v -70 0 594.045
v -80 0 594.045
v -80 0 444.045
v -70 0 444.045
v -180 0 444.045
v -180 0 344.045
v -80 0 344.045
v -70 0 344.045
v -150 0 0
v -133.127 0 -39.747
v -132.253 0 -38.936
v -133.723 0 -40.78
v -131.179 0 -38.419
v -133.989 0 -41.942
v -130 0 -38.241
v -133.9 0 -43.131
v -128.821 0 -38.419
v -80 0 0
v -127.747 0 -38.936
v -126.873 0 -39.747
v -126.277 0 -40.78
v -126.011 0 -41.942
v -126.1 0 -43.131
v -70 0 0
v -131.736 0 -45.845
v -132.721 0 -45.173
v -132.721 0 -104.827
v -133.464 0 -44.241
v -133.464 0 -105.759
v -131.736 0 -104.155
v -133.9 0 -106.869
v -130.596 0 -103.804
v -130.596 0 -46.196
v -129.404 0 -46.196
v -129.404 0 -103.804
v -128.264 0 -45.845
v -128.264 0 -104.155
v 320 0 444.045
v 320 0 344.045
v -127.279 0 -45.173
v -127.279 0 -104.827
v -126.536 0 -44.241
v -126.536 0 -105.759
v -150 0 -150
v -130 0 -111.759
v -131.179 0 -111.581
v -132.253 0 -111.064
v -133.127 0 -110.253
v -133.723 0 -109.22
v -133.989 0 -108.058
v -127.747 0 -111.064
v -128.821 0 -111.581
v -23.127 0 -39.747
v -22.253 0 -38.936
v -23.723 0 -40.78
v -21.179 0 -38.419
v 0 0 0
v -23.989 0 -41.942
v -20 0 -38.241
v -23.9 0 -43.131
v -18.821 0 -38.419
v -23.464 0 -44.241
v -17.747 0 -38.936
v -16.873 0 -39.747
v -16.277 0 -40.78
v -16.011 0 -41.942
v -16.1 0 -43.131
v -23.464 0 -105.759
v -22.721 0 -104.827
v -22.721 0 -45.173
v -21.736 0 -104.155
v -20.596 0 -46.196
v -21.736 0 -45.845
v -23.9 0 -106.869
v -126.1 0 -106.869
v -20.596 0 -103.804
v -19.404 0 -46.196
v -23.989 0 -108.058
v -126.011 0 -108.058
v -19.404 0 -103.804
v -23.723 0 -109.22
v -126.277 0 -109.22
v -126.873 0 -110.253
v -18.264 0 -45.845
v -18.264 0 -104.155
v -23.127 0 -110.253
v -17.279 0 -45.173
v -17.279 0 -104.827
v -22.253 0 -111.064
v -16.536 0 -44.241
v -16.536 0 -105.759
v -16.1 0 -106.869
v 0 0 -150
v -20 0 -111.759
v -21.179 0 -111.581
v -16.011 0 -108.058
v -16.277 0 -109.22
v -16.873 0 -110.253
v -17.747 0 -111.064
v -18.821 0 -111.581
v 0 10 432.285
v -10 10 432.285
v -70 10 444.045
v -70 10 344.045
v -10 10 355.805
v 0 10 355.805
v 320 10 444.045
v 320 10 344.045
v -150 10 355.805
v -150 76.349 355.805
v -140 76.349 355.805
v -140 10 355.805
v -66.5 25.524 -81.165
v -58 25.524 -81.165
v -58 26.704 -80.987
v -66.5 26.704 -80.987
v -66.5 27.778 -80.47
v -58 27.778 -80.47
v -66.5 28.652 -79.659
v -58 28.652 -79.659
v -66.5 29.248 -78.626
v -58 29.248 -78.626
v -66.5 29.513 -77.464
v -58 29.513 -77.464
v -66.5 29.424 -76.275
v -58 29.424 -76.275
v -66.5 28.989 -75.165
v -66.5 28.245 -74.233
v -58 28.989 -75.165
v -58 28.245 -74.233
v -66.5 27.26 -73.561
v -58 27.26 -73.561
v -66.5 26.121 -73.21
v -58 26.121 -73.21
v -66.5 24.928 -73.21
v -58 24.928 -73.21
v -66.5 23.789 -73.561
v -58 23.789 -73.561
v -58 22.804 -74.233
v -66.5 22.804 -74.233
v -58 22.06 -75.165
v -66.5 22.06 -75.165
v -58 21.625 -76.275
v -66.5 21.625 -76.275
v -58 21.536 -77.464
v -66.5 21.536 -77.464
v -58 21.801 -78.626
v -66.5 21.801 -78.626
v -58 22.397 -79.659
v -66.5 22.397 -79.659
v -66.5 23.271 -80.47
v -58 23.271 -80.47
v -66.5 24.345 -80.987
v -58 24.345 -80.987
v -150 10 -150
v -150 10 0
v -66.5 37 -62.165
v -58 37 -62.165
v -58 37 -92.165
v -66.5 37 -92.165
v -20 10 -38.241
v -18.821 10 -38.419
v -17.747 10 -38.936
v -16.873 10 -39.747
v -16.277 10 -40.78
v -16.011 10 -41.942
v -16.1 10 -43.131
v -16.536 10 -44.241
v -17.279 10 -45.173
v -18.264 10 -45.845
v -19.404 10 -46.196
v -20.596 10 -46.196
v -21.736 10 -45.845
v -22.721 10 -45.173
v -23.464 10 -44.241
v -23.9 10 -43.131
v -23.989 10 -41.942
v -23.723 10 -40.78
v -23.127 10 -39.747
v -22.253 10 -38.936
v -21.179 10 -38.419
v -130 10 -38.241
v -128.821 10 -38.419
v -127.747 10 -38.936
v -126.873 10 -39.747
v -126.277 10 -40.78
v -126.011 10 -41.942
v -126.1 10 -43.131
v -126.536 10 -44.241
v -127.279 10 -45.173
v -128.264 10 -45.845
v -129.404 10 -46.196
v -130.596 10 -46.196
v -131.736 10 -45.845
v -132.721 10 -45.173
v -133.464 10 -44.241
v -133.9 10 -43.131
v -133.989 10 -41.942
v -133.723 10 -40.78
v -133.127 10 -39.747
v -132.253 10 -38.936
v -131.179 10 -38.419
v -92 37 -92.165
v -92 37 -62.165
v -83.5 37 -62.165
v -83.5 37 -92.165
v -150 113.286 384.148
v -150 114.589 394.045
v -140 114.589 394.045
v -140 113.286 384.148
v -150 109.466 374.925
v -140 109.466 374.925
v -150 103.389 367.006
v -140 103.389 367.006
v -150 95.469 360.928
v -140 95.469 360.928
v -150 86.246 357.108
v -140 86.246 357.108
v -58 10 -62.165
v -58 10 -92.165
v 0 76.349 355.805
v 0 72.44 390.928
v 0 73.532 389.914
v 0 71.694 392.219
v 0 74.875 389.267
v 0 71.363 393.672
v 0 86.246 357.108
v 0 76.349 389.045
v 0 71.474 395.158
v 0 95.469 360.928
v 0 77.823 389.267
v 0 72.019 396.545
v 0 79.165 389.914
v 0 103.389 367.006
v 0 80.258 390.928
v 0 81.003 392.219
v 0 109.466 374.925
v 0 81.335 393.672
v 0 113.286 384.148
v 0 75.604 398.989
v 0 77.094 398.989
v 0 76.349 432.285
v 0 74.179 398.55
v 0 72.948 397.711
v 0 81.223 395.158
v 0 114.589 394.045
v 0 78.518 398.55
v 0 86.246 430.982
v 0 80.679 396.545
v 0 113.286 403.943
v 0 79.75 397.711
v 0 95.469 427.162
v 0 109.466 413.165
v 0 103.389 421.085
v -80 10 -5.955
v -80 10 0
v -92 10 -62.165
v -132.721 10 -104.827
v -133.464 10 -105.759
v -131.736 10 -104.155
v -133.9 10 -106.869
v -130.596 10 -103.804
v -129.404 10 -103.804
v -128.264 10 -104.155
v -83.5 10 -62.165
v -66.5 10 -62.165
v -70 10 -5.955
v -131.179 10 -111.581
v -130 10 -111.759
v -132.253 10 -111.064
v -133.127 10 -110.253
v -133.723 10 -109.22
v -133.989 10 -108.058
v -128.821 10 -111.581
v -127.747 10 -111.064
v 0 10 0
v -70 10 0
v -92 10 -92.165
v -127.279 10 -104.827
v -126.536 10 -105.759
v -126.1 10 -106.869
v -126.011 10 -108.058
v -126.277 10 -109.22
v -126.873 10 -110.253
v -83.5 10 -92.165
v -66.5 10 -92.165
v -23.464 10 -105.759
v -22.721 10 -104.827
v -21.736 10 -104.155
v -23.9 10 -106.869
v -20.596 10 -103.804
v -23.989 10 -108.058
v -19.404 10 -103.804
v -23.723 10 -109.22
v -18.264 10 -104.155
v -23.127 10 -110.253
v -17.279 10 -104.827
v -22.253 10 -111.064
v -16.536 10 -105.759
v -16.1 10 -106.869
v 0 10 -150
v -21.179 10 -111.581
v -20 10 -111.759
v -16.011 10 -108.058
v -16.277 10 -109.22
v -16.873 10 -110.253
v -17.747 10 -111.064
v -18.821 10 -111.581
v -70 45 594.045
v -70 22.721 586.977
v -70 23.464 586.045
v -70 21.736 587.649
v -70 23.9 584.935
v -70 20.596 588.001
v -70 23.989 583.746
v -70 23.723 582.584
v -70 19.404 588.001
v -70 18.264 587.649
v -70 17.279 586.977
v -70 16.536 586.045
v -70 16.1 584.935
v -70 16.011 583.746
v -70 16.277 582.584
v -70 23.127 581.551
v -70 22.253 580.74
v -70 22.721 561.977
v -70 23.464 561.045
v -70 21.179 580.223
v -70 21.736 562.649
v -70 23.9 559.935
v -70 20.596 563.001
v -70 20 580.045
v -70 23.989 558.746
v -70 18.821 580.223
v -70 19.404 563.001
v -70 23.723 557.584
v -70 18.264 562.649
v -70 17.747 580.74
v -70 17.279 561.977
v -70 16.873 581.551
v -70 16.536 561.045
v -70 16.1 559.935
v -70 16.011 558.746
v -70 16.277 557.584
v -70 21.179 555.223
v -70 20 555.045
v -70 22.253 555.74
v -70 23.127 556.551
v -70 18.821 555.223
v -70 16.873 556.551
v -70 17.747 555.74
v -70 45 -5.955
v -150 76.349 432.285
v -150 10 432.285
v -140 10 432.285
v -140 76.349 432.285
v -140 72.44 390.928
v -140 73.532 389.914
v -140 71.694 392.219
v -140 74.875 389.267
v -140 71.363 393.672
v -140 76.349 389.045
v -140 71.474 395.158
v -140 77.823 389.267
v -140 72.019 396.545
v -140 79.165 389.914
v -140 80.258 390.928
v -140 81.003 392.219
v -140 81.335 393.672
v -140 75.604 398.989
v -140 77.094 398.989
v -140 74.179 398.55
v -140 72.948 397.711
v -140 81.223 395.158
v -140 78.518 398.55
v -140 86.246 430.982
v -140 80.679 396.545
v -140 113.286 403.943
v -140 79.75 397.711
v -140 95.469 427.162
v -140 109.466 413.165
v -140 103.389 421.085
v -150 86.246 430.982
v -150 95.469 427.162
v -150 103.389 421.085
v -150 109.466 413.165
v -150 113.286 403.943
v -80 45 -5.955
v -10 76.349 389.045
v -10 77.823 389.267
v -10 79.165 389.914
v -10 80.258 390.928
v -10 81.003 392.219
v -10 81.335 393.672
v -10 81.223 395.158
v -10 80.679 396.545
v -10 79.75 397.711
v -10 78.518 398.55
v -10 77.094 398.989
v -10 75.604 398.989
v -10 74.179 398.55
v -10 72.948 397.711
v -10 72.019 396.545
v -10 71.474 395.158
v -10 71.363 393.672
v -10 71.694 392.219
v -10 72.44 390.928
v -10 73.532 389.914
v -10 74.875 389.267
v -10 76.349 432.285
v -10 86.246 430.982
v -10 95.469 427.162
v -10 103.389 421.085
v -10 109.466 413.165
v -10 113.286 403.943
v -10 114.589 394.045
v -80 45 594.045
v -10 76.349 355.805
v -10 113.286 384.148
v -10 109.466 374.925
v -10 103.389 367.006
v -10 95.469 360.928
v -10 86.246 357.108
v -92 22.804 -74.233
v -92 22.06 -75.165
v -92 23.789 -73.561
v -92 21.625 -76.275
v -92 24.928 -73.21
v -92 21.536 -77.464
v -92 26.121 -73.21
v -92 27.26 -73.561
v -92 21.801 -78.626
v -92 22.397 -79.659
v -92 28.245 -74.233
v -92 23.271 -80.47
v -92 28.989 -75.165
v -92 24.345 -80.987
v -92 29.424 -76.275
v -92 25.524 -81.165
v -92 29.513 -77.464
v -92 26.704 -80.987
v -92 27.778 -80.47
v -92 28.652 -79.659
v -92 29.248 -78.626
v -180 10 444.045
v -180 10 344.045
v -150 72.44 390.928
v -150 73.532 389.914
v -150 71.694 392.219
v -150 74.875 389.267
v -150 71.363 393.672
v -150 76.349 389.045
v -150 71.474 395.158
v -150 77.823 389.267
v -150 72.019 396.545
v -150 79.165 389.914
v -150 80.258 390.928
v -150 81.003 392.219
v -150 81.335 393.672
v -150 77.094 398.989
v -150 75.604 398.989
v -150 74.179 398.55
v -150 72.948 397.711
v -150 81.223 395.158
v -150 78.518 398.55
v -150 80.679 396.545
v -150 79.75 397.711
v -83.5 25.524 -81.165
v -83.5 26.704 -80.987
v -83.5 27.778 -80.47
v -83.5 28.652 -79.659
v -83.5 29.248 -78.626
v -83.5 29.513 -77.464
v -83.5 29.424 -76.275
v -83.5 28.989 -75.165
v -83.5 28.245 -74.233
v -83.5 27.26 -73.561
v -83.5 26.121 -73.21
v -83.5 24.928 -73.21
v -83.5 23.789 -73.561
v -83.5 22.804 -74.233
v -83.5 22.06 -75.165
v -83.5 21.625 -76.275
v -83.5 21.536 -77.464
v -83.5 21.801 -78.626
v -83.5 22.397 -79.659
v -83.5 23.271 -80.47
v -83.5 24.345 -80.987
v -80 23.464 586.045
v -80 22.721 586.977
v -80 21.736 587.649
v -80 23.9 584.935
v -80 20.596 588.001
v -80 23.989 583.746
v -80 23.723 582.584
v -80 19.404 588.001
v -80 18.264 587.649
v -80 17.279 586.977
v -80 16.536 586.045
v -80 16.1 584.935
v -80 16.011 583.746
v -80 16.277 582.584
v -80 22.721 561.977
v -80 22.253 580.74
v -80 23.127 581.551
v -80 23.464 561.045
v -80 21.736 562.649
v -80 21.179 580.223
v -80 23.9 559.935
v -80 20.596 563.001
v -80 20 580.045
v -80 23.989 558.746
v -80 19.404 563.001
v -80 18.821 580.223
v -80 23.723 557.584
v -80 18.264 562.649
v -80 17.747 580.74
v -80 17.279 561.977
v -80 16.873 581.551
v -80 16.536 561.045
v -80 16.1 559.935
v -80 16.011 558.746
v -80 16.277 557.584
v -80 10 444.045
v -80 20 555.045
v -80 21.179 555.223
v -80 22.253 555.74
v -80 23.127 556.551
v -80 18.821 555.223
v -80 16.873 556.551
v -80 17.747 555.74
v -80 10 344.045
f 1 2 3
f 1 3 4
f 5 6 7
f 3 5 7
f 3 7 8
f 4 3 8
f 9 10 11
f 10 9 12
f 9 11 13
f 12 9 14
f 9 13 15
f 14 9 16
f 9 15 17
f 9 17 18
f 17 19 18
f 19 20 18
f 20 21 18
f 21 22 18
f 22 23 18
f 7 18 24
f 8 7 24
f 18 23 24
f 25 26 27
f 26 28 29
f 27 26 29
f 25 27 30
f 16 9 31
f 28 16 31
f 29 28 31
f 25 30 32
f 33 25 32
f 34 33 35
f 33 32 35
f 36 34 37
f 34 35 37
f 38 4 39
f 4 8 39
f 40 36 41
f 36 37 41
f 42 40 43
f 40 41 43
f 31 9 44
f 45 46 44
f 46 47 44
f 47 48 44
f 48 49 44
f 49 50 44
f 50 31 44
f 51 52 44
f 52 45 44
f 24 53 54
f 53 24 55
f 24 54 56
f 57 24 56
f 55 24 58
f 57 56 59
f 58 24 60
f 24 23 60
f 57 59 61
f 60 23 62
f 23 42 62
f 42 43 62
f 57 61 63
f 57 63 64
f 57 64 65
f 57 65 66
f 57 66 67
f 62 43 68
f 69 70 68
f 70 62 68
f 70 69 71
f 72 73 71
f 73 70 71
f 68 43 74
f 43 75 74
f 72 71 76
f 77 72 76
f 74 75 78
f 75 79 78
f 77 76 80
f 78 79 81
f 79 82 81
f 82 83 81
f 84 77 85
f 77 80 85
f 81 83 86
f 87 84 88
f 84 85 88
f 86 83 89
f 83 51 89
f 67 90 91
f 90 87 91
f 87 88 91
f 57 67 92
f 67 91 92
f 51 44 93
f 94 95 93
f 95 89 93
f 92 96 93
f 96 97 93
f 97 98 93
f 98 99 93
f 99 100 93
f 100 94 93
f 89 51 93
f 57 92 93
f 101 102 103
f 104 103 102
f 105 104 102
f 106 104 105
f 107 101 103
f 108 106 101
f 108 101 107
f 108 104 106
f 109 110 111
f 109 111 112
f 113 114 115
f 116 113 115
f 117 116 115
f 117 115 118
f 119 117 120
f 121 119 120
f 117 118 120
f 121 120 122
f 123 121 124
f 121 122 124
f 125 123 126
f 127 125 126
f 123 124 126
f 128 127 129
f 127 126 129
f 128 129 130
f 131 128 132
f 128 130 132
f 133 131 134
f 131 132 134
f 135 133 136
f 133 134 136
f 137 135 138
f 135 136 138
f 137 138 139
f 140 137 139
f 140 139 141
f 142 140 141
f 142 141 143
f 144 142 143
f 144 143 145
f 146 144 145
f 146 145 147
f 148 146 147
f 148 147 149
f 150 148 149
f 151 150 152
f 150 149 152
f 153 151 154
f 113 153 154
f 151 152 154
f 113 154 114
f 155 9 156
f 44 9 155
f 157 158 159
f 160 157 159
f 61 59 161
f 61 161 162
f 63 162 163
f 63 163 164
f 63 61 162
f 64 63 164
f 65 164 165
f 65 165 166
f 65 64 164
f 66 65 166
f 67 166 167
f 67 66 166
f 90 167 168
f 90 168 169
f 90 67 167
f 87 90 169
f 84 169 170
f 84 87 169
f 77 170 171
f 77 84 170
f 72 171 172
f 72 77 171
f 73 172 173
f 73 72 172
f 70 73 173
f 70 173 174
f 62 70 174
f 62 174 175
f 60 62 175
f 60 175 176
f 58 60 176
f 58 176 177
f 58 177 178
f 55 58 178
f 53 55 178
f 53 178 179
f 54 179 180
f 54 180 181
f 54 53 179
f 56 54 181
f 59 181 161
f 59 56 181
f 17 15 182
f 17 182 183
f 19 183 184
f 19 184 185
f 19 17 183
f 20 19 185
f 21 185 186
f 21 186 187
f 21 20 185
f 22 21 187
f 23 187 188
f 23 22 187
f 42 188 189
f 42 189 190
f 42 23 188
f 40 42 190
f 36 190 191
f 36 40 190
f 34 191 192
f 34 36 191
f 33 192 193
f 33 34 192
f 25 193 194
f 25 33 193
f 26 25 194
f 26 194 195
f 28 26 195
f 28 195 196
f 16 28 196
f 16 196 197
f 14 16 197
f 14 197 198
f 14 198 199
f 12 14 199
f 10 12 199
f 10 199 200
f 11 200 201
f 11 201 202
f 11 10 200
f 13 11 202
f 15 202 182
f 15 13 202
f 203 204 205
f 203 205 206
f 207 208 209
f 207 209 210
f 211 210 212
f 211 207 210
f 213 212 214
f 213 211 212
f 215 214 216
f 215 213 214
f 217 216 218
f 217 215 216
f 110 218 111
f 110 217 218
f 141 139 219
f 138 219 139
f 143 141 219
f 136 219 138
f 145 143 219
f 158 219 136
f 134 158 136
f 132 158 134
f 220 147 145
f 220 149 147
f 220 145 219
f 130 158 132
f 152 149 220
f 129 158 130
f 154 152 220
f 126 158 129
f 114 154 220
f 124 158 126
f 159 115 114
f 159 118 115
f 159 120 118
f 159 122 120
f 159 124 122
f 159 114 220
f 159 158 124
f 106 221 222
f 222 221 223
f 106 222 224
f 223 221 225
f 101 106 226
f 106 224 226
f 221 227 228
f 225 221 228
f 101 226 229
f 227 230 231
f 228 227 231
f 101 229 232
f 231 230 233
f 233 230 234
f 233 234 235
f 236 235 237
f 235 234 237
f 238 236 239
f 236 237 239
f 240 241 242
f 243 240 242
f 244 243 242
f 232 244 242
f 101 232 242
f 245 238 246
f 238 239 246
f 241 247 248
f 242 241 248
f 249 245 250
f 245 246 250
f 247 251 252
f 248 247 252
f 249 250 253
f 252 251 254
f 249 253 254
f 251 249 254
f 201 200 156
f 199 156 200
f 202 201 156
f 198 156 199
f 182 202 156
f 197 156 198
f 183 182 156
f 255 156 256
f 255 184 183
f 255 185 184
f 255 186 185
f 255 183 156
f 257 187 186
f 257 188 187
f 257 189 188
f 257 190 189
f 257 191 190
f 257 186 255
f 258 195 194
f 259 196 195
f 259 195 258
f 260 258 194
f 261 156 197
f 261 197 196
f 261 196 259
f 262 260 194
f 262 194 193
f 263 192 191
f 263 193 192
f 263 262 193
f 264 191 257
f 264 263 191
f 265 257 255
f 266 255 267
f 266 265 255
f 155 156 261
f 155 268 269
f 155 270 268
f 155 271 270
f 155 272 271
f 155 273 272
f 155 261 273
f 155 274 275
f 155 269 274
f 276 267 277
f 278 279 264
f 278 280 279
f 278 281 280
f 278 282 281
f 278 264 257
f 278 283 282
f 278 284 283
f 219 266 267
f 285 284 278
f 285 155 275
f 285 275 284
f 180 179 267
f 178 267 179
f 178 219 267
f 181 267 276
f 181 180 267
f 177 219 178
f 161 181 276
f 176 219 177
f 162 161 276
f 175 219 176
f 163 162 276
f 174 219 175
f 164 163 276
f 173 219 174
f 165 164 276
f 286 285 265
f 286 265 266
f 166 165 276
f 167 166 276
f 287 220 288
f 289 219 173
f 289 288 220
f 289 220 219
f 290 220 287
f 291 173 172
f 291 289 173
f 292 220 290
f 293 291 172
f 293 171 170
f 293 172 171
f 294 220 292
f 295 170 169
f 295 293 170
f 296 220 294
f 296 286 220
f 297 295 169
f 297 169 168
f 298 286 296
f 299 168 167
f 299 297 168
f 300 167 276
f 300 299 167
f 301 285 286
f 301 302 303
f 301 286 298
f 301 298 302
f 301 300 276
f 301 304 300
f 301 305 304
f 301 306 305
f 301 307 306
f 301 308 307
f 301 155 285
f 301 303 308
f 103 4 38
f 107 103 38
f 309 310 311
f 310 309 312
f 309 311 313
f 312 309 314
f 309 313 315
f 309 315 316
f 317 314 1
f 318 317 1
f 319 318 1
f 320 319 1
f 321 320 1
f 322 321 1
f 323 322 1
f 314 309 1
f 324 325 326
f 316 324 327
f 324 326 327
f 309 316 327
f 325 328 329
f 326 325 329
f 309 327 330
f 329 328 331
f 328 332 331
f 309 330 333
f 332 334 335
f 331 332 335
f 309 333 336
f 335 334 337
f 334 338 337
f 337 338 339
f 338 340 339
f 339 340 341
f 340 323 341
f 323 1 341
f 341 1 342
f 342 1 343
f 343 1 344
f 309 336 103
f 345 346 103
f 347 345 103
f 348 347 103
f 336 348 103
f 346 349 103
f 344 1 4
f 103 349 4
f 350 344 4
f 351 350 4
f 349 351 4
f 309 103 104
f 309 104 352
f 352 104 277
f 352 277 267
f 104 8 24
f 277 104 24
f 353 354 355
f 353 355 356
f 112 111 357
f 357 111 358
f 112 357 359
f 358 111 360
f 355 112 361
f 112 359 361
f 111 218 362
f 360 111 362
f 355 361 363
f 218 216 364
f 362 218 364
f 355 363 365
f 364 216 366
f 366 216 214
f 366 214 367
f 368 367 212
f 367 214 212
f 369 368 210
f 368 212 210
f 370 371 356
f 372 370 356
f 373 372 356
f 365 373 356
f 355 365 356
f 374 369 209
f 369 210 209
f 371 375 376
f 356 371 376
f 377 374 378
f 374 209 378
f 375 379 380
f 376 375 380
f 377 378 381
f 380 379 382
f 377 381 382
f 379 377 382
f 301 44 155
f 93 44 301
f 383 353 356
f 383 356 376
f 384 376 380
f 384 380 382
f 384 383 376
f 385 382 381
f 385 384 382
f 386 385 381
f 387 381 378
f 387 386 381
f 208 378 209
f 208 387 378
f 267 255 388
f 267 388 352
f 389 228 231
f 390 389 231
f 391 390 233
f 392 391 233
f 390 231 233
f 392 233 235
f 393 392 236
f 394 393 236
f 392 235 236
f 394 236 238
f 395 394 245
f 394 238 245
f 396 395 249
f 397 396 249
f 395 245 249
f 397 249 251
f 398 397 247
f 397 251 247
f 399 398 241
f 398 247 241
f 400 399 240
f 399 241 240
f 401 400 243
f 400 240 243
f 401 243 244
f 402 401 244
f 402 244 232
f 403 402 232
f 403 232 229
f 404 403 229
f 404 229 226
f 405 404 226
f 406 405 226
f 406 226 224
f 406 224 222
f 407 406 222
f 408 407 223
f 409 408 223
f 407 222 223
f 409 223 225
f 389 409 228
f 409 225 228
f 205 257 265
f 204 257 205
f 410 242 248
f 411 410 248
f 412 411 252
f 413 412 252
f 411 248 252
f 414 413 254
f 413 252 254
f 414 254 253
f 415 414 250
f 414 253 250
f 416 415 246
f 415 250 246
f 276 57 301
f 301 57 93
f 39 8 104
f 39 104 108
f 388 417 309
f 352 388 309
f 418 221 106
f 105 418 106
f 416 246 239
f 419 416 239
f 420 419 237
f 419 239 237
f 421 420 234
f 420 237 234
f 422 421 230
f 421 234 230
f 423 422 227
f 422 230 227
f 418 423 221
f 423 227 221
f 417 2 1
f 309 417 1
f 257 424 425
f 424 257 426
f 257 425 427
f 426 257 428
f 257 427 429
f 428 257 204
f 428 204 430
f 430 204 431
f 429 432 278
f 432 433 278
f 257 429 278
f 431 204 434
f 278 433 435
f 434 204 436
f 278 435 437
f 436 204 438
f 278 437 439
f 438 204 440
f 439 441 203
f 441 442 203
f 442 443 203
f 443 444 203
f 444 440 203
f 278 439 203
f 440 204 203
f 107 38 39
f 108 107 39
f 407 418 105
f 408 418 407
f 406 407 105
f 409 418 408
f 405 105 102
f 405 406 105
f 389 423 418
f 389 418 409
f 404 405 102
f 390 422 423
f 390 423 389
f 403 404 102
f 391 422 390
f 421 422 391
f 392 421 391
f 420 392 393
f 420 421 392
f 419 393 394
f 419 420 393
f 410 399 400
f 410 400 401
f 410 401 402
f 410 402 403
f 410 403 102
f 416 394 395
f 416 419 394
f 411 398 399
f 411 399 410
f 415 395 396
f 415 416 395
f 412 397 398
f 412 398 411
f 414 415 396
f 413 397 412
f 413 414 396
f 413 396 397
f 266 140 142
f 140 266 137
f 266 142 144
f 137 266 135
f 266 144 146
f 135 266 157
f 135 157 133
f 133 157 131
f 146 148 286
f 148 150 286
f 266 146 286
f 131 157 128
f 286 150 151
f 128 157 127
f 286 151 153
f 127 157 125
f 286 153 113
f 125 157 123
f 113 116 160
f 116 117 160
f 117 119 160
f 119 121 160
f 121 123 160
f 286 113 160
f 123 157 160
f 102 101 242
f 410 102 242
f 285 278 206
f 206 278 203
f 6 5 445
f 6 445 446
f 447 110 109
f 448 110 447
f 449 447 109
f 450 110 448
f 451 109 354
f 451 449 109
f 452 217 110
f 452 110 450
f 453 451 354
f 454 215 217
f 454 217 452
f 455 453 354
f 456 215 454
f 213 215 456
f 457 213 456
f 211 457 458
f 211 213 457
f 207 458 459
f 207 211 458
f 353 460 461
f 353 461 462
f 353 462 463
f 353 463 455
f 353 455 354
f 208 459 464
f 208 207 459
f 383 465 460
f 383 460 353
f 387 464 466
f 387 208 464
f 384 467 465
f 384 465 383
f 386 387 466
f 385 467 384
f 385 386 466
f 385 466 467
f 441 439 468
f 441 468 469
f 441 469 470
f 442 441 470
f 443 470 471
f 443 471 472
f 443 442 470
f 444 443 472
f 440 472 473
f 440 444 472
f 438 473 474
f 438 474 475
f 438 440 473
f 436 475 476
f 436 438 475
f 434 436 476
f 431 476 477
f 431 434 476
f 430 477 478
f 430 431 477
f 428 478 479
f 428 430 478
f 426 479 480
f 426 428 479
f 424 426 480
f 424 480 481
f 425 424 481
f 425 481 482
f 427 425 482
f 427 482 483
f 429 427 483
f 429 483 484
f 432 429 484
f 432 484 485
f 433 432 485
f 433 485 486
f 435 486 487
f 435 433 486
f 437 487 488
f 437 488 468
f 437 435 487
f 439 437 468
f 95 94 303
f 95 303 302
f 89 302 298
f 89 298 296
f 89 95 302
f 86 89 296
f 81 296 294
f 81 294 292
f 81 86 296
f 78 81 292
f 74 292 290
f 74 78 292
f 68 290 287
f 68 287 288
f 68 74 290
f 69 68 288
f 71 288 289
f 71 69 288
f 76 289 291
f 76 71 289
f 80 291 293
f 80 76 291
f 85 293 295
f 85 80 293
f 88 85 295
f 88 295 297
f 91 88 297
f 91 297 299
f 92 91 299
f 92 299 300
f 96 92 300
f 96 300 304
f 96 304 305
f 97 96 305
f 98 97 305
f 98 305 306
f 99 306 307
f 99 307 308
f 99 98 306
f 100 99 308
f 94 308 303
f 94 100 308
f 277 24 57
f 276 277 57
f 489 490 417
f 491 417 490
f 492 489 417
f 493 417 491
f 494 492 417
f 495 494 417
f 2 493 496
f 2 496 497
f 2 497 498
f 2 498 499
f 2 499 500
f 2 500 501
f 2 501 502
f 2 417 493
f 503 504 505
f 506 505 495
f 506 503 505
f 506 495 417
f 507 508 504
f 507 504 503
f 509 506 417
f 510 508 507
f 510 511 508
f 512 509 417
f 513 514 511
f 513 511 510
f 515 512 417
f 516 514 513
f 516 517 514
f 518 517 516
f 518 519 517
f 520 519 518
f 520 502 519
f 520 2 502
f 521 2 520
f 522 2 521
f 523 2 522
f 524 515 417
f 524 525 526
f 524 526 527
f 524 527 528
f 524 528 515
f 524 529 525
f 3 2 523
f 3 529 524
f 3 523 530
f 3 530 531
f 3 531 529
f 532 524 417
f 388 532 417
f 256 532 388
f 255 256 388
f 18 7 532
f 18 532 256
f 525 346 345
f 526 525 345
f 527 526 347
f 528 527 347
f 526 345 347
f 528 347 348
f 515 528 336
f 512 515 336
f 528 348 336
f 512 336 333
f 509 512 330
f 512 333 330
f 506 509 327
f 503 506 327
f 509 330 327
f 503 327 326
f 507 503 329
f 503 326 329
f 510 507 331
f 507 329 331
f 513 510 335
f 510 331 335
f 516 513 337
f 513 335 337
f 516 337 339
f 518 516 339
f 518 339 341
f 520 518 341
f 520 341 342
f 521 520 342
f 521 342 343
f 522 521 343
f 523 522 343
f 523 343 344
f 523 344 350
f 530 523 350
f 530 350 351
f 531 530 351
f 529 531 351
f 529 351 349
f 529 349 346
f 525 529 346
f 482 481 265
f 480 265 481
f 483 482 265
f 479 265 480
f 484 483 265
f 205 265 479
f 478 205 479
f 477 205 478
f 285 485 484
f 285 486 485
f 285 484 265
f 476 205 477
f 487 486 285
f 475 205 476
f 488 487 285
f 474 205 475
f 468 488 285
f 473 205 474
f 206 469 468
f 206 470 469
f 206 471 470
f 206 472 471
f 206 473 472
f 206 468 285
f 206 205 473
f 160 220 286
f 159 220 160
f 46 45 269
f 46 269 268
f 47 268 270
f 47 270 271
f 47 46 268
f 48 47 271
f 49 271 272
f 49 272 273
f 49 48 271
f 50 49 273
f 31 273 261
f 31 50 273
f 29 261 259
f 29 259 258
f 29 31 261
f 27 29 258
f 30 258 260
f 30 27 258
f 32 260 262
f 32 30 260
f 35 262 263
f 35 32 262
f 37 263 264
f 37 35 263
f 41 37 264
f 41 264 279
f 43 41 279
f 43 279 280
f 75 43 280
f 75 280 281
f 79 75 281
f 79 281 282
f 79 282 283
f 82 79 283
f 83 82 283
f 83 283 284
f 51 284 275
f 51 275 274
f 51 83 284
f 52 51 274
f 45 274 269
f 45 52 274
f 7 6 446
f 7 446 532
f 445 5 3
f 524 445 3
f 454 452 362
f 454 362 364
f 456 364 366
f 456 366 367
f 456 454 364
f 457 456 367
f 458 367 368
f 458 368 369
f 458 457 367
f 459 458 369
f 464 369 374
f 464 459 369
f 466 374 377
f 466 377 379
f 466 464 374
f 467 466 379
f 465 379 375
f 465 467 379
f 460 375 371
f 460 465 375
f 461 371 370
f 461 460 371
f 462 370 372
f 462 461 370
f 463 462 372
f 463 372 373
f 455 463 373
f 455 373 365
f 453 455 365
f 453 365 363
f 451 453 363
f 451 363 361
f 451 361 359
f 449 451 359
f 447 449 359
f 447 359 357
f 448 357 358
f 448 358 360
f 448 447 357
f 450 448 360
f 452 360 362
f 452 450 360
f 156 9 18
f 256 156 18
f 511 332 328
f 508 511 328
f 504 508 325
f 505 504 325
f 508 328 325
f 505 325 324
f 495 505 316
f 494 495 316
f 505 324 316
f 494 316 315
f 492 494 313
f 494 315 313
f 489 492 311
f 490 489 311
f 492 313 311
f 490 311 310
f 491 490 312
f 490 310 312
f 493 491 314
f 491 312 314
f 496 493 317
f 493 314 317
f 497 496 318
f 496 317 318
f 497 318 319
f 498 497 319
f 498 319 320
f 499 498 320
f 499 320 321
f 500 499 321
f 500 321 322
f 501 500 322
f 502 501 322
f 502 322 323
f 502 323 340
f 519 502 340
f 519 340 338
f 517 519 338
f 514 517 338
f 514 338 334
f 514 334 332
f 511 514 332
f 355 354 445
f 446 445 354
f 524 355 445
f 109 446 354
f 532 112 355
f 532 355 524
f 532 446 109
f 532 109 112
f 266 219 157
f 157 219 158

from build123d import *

# Parameters (mm, degrees)
SKETCH2_W           = 150
SKETCH2_H           = 150
SKETCH2_R           = 4
BOSS_EXTRUDE2_DEPTH = 10
SKETCH3_W           = 10
SKETCH3_H           = 600
BOSS_EXTRUDE3_DEPTH = 45
SKETCH4_W           = 500
SKETCH4_H           = 100
BOSS_EXTRUDE4_DEPTH = 10
SKETCH5_R           = 5
BOSS_EXTRUDE5_DEPTH = 10
SKETCH7_W           = 30
SKETCH7_H           = 27
SKETCH7_R           = 4
BOSS_EXTRUDE6_DEPTH = 8.5
SKETCH8_R           = 4
CUT_EXTRUDE1_DEPTH  = 720.805795864


with BuildPart() as part:
    # Sketch2 → Boss-Extrude2 (new body)
    with BuildSketch(Plane(origin=(0, 0, 0), x_dir=(1, 0, 0), z_dir=(0, 1, 0))):
        with Locations((-75, 75)):
            Rectangle(SKETCH2_W, SKETCH2_H)
        with Locations(Location((-130, 42.241144312, 0), (0, 0, 270))):
            Circle(SKETCH2_R, mode=Mode.SUBTRACT)
        with Locations(Location((-20, 42.241144312, 0), (0, 0, 270))):
            Circle(SKETCH2_R, mode=Mode.SUBTRACT)
        with Locations(Location((-20, 107.758855688, 0), (0, 0, 90))):
            Circle(SKETCH2_R, mode=Mode.SUBTRACT)
        with Locations(Location((-130, 107.758855688, 0), (0, 0, 90))):
            Circle(SKETCH2_R, mode=Mode.SUBTRACT)
    extrude(amount=BOSS_EXTRUDE2_DEPTH)

    # Sketch3 → Boss-Extrude3 (add)
    with BuildSketch(Plane(origin=(0, 0, 0), x_dir=(1, 0, 0), z_dir=(0, 1, 0))):
        with Locations((-75, -294.045278836)):
            Rectangle(SKETCH3_W, SKETCH3_H)
    extrude(amount=BOSS_EXTRUDE3_DEPTH)

    # Sketch4 → Boss-Extrude4 (add)
    with BuildSketch(Plane(origin=(0, 0, 0), x_dir=(1, 0, 0), z_dir=(0, 1, 0))):
        with Locations((70, -394.045278836)):
            Rectangle(SKETCH4_W, SKETCH4_H)
    extrude(amount=BOSS_EXTRUDE4_DEPTH)

    # Sketch5 → Boss-Extrude5 (add)
    with BuildSketch(Plane(origin=(0, 0, 0), x_dir=(0, 0, -1), z_dir=(1, 0, 0))):
        with BuildLine():
            Line((-432.285278836, 10), (-432.285278836, 76.348788506))
            ThreePointArc((-432.285278836, 76.348788506), (-421.085042149, 103.388551818), (-394.045278836, 114.588788506))
            ThreePointArc((-394.045278836, 114.588788506), (-367.005515524, 103.388551818), (-355.805278836, 76.348788506))
            Line((-355.805278836, 76.348788506), (-355.805278836, 10))
            Line((-355.805278836, 10), (-432.285278836, 10))
        make_face()
        with Locations((-394.045278836, 76.348788506)):
            Circle(SKETCH5_R, mode=Mode.SUBTRACT)
    boss_extrude5 = extrude(amount=-BOSS_EXTRUDE5_DEPTH)

    # Mirror1: Boss-Extrude5 across plane
    add(boss_extrude5.mirror(Plane(origin=(-75, 0, 0), x_dir=(0, 0, 1), z_dir=(1, 0, 0))))

    # Sketch7 → Boss-Extrude6 (add)
    with BuildSketch(Plane(origin=(-58, 0, 0), x_dir=(0, 0, -1), z_dir=(1, 0, 0))):
        with Locations((77.164979512, 23.5)):
            Rectangle(SKETCH7_W, SKETCH7_H)
        with Locations((77.164979512, 25.524498442)):
            Circle(SKETCH7_R, mode=Mode.SUBTRACT)
    boss_extrude6 = extrude(amount=-BOSS_EXTRUDE6_DEPTH)

    # Mirror2: Boss-Extrude6 across plane
    add(boss_extrude6.mirror(Plane(origin=(-75, 0, 0), x_dir=(0, 0, 1), z_dir=(1, 0, 0))))

    # Sketch8 → Cut-Extrude1 (cut, through all)
    with BuildSketch(Plane(origin=(-70, 0, 0), x_dir=(0, 0, -1), z_dir=(1, 0, 0))):
        with Locations((-584.045278836, 20)):
            Circle(SKETCH8_R)
        with Locations((-559.045278836, 20)):
            Circle(SKETCH8_R)
    extrude(amount=-CUT_EXTRUDE1_DEPTH, mode=Mode.SUBTRACT)


solid = part.part
